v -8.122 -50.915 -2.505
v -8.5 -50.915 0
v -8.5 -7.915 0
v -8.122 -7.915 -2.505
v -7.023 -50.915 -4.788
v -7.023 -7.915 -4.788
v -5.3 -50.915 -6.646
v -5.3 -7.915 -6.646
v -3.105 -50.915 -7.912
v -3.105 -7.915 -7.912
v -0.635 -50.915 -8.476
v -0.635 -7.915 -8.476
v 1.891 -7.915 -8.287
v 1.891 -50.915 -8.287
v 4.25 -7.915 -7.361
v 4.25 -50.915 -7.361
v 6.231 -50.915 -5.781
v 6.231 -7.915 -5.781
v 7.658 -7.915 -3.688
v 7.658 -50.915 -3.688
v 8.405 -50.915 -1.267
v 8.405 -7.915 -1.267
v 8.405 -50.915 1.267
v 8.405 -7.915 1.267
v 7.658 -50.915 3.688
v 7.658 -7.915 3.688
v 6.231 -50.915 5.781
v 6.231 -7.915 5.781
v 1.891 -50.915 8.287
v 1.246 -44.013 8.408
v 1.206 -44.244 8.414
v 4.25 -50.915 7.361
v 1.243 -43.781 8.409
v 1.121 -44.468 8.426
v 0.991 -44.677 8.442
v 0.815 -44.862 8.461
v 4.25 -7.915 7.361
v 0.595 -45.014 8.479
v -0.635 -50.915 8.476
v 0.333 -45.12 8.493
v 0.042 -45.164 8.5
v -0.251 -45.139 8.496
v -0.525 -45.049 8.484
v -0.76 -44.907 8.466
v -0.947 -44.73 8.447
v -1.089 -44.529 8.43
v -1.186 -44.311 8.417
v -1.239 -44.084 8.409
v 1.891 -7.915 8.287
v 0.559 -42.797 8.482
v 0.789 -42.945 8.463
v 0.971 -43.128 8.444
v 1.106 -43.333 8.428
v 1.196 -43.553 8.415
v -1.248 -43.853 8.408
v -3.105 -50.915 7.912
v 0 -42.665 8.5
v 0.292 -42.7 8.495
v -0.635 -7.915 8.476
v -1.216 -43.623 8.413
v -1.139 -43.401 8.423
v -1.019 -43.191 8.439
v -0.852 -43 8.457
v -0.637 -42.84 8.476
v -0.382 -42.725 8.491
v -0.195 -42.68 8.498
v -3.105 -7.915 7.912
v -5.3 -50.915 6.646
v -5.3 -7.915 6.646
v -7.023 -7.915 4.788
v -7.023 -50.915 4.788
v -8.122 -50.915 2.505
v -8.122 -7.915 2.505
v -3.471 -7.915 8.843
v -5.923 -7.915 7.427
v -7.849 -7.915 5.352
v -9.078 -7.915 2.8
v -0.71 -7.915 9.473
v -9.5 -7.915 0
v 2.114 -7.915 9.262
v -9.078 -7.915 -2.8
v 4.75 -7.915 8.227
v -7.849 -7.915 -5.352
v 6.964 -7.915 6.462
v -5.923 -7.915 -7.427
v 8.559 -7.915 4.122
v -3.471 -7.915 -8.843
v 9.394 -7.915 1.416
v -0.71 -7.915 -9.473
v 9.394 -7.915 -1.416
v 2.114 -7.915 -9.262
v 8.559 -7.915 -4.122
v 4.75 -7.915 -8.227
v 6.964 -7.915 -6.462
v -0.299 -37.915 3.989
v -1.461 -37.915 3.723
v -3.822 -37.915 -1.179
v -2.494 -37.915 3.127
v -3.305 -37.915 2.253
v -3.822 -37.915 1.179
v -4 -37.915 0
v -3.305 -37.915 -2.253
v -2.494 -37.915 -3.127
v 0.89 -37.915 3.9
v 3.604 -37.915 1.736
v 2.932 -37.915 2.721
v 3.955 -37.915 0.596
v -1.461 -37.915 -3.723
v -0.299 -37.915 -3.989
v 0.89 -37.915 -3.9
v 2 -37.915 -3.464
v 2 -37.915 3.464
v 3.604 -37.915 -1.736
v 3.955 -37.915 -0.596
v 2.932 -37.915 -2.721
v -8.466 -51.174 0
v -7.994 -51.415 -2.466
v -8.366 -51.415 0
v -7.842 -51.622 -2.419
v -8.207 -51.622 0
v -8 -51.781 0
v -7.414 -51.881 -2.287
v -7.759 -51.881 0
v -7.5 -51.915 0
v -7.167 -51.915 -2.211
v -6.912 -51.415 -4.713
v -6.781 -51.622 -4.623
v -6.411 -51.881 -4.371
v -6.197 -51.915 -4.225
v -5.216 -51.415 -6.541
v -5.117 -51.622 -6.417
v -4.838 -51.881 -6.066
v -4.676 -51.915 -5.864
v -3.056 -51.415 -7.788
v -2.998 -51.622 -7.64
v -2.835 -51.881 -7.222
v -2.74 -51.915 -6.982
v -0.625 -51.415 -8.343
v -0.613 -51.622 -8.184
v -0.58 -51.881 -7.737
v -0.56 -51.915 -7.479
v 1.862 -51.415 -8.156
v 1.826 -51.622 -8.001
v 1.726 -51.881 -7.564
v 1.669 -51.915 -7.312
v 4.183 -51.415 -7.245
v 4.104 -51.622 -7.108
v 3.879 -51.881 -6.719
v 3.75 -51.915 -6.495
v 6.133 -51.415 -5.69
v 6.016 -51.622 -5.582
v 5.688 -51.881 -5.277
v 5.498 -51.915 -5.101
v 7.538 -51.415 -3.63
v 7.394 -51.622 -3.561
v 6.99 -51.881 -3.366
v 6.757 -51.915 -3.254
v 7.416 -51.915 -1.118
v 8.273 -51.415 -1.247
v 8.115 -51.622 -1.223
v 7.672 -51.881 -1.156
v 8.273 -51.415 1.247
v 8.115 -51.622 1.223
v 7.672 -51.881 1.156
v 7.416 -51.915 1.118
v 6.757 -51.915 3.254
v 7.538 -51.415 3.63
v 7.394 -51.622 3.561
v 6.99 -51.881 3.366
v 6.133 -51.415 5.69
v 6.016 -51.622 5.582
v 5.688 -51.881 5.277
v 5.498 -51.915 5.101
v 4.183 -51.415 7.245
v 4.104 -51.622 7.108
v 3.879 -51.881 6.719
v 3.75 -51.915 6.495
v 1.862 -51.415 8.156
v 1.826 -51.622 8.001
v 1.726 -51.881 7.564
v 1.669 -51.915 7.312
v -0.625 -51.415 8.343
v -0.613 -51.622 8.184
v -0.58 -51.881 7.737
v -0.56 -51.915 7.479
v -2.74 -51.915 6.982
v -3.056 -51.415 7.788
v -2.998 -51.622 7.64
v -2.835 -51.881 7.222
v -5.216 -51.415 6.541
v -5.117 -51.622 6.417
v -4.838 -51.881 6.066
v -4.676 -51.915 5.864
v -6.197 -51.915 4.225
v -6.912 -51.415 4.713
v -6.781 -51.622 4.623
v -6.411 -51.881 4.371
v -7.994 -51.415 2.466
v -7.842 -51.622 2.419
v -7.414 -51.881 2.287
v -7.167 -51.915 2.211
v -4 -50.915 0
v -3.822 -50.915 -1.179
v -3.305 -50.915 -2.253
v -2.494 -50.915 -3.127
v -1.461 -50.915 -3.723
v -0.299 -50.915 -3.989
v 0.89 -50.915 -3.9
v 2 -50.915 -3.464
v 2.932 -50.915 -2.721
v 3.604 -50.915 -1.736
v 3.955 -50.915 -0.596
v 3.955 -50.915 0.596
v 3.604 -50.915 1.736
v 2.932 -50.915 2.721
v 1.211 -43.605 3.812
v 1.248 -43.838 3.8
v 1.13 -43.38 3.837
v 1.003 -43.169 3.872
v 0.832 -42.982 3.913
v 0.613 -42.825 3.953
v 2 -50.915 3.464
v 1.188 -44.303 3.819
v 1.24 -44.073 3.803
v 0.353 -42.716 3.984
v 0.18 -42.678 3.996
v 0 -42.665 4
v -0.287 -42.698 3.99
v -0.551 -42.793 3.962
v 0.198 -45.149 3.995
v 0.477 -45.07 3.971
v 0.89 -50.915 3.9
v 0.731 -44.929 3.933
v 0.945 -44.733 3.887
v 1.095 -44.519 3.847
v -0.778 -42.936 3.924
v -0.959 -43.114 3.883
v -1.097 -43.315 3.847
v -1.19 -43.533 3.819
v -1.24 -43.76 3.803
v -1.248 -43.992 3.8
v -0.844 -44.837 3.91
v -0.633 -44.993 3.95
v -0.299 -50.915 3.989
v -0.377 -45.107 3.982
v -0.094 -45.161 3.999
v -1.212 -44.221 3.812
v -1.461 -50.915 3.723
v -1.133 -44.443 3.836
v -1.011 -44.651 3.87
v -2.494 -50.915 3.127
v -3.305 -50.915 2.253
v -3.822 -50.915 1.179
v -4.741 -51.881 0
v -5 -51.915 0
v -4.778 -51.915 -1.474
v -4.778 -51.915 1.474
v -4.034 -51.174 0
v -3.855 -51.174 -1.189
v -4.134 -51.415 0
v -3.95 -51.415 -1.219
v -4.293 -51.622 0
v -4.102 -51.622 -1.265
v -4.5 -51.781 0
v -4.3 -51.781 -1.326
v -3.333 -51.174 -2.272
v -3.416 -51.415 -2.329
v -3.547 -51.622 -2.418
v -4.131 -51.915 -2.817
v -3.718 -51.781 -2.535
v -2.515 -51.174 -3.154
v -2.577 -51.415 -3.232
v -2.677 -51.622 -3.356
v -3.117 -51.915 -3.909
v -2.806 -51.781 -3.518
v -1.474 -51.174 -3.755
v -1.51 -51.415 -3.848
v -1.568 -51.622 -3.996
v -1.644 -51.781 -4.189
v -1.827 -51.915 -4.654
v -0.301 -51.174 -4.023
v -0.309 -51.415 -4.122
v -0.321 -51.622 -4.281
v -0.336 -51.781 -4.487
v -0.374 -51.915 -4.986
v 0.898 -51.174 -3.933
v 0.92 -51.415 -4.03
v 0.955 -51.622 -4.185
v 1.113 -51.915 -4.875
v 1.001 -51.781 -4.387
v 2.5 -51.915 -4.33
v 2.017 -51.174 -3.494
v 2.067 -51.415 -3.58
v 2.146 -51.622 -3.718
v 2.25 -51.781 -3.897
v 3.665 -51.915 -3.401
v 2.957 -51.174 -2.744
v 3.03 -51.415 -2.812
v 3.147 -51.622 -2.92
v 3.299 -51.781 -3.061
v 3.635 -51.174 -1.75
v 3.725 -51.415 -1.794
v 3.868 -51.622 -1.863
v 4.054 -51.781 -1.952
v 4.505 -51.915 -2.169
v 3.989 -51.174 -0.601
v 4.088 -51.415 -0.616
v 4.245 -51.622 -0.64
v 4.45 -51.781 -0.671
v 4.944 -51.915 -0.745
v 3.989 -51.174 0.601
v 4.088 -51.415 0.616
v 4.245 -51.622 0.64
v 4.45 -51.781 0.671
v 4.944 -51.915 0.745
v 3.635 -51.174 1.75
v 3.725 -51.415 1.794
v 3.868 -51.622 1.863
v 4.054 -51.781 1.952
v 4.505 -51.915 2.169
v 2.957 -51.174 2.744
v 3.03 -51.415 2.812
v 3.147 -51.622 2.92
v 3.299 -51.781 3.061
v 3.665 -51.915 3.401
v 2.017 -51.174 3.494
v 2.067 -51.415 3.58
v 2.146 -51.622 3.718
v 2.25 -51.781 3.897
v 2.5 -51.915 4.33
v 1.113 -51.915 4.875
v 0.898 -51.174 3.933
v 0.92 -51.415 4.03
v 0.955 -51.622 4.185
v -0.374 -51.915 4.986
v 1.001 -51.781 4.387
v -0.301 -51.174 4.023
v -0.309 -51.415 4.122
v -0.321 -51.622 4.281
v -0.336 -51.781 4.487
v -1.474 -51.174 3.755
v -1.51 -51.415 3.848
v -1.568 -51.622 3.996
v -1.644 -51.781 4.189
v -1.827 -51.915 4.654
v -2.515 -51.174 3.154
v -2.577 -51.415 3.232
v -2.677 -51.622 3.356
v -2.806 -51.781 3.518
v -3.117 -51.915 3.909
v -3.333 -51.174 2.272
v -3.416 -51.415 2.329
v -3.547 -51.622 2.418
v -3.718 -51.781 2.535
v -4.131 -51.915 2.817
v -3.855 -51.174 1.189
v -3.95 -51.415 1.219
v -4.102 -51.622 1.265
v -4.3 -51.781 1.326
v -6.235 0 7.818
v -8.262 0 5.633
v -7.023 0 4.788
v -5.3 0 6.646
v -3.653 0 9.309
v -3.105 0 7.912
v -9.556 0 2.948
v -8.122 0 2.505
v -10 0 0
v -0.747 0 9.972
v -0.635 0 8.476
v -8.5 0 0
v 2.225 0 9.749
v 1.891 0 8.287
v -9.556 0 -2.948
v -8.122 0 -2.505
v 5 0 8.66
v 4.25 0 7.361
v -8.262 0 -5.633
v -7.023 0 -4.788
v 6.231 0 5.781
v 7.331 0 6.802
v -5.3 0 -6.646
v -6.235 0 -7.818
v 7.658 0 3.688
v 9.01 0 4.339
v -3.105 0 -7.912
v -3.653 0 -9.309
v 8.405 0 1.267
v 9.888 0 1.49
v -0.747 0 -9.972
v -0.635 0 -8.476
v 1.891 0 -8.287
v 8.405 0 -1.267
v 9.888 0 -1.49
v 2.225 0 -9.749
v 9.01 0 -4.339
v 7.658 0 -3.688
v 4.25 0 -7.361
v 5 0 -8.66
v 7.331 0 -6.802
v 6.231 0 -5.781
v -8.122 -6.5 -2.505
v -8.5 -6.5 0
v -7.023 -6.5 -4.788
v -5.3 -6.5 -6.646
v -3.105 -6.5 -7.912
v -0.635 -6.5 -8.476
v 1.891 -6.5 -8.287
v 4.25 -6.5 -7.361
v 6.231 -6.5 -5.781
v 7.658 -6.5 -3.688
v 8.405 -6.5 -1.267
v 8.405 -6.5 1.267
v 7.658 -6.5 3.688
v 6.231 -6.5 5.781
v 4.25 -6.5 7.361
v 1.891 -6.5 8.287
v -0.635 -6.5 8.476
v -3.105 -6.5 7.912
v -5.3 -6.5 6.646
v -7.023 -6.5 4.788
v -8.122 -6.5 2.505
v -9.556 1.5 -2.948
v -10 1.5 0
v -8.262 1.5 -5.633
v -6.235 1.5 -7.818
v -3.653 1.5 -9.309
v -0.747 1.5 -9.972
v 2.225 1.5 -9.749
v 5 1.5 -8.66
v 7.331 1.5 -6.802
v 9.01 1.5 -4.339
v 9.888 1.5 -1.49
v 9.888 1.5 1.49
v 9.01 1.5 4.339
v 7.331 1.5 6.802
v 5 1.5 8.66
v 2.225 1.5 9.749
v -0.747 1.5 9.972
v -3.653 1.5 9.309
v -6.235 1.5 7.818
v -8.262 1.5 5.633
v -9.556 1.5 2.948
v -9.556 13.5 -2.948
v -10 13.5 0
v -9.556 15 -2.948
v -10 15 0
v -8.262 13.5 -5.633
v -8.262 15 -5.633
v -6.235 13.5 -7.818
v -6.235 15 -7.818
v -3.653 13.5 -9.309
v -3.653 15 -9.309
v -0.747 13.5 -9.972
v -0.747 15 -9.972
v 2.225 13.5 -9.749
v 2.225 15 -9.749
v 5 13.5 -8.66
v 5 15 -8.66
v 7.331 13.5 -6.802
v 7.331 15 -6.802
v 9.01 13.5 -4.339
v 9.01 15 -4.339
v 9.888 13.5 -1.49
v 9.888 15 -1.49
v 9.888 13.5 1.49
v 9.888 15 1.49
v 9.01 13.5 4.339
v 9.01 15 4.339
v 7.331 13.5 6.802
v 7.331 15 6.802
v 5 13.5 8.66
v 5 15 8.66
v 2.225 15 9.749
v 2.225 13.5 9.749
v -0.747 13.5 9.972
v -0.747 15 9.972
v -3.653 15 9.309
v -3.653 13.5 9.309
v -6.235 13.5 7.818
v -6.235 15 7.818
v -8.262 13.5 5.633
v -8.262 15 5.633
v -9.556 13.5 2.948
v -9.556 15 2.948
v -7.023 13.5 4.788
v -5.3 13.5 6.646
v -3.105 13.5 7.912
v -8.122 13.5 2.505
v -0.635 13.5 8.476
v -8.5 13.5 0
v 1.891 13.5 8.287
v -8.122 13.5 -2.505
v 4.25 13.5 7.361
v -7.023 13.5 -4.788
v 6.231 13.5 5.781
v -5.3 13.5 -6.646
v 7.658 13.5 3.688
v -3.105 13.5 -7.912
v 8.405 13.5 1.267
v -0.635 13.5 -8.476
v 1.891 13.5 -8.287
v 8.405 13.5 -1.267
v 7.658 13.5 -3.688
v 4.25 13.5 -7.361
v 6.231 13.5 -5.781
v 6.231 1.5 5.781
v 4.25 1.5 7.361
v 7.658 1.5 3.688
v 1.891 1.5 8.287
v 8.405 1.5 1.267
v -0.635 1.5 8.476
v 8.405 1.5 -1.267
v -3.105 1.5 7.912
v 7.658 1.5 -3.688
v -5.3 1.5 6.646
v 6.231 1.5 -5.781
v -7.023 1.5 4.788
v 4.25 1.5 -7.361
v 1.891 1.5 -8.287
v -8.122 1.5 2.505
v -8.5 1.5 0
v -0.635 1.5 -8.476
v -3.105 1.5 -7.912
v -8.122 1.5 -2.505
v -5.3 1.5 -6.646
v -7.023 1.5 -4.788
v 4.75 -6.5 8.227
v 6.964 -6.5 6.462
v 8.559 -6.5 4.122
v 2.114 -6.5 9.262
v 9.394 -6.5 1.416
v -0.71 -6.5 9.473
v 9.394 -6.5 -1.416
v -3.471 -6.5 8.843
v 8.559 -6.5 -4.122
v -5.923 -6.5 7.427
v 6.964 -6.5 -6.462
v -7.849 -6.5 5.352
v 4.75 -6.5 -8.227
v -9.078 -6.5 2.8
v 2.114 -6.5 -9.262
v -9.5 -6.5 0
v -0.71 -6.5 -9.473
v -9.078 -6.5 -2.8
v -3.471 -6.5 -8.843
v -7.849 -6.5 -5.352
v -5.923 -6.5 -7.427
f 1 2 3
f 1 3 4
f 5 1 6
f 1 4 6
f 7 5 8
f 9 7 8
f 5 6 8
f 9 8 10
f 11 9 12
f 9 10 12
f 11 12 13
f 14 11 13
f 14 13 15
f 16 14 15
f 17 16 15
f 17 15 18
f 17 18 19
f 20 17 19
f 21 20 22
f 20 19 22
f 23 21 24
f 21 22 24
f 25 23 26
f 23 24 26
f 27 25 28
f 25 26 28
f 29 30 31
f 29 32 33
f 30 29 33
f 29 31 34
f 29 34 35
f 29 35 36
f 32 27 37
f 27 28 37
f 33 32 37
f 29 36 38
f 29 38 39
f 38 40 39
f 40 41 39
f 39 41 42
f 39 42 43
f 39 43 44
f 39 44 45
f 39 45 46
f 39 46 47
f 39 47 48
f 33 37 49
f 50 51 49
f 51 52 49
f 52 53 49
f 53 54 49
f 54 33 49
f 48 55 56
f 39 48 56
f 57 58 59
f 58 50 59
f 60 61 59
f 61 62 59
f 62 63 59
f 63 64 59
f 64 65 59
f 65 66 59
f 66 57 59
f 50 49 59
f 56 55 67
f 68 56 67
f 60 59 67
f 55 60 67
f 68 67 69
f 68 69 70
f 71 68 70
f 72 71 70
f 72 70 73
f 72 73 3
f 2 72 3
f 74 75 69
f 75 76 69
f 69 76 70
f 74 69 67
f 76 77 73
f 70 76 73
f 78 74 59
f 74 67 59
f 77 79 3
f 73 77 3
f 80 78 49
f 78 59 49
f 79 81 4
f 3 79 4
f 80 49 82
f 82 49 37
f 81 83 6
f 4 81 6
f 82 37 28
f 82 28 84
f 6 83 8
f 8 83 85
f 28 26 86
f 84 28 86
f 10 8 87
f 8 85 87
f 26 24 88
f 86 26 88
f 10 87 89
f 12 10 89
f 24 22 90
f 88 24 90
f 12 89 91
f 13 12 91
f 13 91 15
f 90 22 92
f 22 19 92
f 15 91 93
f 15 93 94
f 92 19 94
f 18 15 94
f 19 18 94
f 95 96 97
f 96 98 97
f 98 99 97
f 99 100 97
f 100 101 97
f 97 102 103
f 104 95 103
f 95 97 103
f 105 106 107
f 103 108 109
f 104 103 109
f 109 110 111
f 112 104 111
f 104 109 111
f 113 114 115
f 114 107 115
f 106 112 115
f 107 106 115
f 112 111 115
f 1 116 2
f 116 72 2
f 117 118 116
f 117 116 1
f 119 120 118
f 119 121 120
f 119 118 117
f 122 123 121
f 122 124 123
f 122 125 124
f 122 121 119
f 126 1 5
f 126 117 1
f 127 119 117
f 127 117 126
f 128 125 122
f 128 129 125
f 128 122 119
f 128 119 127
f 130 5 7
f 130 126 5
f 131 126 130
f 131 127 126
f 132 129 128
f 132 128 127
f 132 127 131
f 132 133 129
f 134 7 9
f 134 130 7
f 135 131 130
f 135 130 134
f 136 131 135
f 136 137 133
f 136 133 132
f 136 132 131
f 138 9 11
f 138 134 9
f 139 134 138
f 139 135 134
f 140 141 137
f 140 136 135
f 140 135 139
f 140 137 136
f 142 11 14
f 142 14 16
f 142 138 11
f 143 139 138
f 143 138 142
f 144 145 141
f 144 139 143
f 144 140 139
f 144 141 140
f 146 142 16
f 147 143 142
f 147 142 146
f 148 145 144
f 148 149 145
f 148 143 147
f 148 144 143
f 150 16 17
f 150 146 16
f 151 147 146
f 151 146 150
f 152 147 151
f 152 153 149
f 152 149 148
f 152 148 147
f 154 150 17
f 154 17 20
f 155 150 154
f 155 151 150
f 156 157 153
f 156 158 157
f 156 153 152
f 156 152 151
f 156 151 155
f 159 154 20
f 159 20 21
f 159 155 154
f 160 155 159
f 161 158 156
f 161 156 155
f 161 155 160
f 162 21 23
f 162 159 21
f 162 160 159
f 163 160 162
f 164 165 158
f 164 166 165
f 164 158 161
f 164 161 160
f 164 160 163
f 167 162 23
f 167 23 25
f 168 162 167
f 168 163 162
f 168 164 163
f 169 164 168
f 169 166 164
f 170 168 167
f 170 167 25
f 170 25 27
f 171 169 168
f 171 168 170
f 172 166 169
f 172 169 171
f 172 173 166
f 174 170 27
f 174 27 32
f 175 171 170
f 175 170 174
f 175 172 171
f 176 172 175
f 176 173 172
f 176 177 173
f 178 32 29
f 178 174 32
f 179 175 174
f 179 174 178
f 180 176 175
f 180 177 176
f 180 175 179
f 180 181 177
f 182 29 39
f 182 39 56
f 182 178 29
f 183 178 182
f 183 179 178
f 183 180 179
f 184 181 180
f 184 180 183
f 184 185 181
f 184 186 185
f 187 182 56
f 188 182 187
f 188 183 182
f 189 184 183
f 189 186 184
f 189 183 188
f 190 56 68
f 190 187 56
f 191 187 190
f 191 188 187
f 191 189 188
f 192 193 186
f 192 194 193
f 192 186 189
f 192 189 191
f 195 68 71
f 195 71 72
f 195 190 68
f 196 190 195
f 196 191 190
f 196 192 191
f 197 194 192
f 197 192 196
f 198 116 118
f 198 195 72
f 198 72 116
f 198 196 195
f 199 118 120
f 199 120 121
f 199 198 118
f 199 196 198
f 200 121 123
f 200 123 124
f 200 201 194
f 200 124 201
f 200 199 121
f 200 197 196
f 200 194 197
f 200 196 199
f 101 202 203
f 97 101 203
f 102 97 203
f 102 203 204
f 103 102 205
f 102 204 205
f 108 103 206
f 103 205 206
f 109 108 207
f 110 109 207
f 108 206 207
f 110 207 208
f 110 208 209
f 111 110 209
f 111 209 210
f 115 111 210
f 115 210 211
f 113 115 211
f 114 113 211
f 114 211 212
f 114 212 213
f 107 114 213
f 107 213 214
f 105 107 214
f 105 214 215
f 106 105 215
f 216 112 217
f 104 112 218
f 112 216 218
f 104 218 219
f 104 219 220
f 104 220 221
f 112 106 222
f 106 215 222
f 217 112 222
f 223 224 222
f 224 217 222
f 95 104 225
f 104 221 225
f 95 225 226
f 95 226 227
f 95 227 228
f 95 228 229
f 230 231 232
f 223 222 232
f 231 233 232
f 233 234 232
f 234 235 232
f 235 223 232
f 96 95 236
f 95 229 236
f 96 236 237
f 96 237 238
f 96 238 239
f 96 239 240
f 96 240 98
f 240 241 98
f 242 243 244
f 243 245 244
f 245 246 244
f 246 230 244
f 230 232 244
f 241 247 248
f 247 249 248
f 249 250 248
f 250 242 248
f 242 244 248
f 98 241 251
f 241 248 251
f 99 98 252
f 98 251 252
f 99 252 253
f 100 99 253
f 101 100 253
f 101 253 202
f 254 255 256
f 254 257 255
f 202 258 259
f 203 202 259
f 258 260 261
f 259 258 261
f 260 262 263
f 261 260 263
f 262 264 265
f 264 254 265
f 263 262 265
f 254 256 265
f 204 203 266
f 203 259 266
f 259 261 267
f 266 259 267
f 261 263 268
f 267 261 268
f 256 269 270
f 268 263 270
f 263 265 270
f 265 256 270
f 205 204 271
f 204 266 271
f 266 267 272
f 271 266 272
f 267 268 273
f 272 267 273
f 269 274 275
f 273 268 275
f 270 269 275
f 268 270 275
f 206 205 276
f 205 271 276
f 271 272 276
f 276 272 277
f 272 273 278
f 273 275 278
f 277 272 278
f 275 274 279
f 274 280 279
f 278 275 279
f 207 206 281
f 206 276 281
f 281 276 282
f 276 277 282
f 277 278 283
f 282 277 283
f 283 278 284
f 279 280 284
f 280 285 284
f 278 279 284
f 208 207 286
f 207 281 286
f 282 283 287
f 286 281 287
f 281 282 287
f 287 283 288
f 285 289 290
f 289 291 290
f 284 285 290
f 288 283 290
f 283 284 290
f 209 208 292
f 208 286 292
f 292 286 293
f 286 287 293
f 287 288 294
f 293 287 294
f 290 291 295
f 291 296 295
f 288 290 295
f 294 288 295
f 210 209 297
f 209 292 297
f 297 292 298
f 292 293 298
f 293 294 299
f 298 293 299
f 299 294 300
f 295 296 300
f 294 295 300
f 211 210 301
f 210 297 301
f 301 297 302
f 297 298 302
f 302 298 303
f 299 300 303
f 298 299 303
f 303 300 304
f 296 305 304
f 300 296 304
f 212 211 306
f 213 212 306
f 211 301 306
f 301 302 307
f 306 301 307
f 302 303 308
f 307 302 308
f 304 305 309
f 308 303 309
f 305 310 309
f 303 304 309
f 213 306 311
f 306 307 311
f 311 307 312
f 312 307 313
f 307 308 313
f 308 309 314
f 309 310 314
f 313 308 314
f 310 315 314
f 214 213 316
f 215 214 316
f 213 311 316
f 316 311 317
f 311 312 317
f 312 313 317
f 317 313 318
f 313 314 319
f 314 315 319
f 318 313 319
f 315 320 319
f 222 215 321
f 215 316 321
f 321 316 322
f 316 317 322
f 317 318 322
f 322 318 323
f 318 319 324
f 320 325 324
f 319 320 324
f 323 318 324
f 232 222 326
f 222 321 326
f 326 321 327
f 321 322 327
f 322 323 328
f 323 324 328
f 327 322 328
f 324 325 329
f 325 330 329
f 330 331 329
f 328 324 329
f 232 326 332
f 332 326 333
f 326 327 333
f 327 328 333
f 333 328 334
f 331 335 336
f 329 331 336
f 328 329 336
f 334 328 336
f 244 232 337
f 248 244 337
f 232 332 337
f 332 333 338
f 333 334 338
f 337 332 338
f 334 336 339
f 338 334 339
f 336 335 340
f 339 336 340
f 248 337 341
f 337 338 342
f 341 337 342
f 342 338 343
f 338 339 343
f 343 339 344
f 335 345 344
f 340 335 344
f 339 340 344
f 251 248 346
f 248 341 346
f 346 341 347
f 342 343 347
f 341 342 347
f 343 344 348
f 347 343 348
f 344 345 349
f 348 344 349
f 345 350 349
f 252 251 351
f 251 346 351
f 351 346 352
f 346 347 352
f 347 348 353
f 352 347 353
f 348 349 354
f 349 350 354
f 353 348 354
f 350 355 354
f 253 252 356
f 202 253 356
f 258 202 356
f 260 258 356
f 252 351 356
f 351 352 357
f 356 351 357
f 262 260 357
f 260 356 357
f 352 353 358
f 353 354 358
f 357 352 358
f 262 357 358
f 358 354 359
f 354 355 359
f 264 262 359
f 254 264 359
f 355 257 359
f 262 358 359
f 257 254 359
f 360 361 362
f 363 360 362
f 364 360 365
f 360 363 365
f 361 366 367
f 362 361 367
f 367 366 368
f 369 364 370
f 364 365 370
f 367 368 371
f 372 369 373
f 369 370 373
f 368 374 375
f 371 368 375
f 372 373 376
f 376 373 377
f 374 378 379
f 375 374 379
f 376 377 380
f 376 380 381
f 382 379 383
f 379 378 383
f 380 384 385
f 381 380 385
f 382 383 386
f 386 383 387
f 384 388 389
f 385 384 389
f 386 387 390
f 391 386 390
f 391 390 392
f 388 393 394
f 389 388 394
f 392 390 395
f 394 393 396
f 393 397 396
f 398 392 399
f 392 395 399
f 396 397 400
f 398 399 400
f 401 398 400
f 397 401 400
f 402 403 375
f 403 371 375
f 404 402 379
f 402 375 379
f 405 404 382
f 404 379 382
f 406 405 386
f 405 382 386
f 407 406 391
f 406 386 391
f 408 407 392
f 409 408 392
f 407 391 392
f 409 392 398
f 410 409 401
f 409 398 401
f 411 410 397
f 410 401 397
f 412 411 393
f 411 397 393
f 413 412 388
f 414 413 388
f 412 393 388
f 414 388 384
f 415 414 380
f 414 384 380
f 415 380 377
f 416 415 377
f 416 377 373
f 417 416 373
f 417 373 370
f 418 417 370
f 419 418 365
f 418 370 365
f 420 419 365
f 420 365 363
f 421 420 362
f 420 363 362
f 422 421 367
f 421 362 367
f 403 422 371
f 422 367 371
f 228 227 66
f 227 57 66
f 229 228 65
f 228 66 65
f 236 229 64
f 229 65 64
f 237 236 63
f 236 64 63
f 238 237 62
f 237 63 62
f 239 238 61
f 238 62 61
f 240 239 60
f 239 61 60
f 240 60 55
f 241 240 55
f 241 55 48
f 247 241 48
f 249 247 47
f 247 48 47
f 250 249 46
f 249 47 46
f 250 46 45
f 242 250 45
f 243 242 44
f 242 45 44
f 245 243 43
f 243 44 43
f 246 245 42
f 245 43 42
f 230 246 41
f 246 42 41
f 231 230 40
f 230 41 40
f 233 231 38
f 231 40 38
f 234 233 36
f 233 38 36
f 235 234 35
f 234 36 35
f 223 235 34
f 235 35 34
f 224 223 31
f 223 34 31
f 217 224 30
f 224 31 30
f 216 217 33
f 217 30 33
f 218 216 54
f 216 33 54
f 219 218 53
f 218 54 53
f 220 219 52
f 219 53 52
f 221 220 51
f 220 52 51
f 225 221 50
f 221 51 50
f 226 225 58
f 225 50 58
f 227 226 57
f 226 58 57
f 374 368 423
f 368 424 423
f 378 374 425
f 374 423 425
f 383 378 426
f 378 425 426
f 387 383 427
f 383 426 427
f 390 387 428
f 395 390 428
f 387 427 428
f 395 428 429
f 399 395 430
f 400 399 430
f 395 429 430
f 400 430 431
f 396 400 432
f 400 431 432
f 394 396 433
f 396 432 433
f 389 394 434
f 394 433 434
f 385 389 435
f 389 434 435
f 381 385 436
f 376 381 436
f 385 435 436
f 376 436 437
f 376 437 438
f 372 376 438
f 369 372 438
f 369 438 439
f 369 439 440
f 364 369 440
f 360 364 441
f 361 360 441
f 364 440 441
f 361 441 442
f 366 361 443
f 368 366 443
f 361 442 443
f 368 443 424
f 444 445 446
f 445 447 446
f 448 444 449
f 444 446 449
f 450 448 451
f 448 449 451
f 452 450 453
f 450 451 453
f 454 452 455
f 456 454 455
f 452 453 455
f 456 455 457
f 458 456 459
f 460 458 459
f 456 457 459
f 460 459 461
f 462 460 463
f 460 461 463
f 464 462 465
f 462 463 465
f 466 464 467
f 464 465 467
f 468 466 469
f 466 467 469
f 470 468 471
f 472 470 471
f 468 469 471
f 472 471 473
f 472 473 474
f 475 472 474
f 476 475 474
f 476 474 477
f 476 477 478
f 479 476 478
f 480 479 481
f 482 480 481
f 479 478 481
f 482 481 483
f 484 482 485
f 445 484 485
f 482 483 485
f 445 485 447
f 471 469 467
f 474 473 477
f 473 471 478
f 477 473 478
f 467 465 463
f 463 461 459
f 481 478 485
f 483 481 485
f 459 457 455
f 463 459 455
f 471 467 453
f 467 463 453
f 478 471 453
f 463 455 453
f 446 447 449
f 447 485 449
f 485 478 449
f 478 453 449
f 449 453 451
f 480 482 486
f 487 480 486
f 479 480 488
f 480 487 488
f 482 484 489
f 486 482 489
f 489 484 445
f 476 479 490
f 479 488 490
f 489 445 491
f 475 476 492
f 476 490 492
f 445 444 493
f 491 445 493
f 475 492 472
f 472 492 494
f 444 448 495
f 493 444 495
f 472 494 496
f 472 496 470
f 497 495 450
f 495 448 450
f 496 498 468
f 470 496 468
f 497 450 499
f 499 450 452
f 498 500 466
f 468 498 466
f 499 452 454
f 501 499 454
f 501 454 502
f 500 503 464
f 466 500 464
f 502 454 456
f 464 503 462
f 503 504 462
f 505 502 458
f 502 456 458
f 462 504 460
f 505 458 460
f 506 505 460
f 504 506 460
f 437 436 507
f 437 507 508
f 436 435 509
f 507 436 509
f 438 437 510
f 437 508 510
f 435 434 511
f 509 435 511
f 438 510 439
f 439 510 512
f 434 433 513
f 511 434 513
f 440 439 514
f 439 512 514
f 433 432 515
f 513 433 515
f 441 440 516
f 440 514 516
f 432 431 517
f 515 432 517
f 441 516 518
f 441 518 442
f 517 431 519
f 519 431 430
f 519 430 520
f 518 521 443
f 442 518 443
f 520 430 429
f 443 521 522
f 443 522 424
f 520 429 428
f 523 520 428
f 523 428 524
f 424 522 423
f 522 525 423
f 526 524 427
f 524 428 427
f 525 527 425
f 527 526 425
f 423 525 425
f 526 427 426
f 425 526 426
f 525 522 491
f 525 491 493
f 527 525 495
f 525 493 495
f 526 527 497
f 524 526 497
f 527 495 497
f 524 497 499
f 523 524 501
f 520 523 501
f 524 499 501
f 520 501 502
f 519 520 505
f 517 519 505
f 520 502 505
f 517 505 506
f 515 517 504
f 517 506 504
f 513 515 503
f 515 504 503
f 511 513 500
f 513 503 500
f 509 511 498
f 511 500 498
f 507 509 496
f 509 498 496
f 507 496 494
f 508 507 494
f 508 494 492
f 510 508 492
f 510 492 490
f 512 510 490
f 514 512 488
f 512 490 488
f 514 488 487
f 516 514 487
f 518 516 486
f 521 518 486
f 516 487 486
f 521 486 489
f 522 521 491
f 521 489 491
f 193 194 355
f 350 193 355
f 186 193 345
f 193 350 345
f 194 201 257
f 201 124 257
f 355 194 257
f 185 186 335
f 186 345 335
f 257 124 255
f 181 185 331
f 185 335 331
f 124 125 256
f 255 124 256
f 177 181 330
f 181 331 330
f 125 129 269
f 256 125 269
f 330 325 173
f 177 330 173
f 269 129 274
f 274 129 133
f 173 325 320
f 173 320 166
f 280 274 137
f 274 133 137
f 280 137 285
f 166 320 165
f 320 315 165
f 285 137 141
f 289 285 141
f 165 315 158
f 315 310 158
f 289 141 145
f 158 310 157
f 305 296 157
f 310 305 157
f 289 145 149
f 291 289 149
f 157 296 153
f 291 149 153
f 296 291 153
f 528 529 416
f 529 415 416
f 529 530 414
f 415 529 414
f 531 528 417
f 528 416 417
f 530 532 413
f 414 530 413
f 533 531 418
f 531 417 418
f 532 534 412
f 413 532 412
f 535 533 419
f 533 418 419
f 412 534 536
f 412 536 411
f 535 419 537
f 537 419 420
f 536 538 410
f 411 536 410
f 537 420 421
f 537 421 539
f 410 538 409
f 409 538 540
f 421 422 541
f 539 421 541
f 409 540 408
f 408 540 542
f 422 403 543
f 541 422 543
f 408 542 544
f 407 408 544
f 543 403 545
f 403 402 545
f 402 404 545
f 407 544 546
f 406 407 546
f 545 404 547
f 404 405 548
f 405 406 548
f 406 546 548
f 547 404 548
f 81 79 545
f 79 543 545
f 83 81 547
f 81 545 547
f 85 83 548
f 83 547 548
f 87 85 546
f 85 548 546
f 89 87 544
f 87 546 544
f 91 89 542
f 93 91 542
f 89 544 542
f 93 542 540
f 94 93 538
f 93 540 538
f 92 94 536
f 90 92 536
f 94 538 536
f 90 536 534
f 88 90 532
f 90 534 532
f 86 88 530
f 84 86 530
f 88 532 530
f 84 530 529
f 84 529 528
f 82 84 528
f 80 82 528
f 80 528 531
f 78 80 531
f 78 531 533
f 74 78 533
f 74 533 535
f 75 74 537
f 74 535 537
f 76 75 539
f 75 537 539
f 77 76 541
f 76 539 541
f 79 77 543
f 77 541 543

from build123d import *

# Parameters (mm, degrees)
FILLET1_R = 1
SKETCH3_W = 1.25
SKETCH3_H = 8.5


with BuildPart() as part:
    # Sketch1 → Revolve1 (revolve)
    with BuildSketch(Plane.XY):
        Polygon((-8.5, -51.915), (-8.5, -7.915), (-9.5, -7.915), (-9.5, -6.5), (-8.5, -6.5), (-8.5, 0), (-10, 0), (-10, 1.5), (-8.5, 1.5), (-8.5, 13.5), (-10, 13.5), (-10, 15), (0, 15), (0, -37.915), (-4, -37.915), (-4, -51.915), align=None)
    revolve(axis=Axis((0, 15, 0), (0, -1, 0)))

    # Fillet1
    fillet1_edges = [part.edges().sort_by_distance(p)[0] for p in [
        (8.5, -51.915, 0),
        (4, -51.915, 0),
    ]]
    fillet(fillet1_edges, radius=FILLET1_R)

    # Sketch3 → M3x0.5 Tapped Hole1 (revolve, cut)
    with BuildSketch(Plane(origin=(0, -43.915, 0), x_dir=(0, 1, 0), z_dir=(1, 0, 0))):
        with Locations((0.625, 4.25)):
            Rectangle(SKETCH3_W, SKETCH3_H)
    revolve(axis=Axis((0, -43.915, -6.35), (0, 0, 1)), mode=Mode.SUBTRACT)


solid = part.part
